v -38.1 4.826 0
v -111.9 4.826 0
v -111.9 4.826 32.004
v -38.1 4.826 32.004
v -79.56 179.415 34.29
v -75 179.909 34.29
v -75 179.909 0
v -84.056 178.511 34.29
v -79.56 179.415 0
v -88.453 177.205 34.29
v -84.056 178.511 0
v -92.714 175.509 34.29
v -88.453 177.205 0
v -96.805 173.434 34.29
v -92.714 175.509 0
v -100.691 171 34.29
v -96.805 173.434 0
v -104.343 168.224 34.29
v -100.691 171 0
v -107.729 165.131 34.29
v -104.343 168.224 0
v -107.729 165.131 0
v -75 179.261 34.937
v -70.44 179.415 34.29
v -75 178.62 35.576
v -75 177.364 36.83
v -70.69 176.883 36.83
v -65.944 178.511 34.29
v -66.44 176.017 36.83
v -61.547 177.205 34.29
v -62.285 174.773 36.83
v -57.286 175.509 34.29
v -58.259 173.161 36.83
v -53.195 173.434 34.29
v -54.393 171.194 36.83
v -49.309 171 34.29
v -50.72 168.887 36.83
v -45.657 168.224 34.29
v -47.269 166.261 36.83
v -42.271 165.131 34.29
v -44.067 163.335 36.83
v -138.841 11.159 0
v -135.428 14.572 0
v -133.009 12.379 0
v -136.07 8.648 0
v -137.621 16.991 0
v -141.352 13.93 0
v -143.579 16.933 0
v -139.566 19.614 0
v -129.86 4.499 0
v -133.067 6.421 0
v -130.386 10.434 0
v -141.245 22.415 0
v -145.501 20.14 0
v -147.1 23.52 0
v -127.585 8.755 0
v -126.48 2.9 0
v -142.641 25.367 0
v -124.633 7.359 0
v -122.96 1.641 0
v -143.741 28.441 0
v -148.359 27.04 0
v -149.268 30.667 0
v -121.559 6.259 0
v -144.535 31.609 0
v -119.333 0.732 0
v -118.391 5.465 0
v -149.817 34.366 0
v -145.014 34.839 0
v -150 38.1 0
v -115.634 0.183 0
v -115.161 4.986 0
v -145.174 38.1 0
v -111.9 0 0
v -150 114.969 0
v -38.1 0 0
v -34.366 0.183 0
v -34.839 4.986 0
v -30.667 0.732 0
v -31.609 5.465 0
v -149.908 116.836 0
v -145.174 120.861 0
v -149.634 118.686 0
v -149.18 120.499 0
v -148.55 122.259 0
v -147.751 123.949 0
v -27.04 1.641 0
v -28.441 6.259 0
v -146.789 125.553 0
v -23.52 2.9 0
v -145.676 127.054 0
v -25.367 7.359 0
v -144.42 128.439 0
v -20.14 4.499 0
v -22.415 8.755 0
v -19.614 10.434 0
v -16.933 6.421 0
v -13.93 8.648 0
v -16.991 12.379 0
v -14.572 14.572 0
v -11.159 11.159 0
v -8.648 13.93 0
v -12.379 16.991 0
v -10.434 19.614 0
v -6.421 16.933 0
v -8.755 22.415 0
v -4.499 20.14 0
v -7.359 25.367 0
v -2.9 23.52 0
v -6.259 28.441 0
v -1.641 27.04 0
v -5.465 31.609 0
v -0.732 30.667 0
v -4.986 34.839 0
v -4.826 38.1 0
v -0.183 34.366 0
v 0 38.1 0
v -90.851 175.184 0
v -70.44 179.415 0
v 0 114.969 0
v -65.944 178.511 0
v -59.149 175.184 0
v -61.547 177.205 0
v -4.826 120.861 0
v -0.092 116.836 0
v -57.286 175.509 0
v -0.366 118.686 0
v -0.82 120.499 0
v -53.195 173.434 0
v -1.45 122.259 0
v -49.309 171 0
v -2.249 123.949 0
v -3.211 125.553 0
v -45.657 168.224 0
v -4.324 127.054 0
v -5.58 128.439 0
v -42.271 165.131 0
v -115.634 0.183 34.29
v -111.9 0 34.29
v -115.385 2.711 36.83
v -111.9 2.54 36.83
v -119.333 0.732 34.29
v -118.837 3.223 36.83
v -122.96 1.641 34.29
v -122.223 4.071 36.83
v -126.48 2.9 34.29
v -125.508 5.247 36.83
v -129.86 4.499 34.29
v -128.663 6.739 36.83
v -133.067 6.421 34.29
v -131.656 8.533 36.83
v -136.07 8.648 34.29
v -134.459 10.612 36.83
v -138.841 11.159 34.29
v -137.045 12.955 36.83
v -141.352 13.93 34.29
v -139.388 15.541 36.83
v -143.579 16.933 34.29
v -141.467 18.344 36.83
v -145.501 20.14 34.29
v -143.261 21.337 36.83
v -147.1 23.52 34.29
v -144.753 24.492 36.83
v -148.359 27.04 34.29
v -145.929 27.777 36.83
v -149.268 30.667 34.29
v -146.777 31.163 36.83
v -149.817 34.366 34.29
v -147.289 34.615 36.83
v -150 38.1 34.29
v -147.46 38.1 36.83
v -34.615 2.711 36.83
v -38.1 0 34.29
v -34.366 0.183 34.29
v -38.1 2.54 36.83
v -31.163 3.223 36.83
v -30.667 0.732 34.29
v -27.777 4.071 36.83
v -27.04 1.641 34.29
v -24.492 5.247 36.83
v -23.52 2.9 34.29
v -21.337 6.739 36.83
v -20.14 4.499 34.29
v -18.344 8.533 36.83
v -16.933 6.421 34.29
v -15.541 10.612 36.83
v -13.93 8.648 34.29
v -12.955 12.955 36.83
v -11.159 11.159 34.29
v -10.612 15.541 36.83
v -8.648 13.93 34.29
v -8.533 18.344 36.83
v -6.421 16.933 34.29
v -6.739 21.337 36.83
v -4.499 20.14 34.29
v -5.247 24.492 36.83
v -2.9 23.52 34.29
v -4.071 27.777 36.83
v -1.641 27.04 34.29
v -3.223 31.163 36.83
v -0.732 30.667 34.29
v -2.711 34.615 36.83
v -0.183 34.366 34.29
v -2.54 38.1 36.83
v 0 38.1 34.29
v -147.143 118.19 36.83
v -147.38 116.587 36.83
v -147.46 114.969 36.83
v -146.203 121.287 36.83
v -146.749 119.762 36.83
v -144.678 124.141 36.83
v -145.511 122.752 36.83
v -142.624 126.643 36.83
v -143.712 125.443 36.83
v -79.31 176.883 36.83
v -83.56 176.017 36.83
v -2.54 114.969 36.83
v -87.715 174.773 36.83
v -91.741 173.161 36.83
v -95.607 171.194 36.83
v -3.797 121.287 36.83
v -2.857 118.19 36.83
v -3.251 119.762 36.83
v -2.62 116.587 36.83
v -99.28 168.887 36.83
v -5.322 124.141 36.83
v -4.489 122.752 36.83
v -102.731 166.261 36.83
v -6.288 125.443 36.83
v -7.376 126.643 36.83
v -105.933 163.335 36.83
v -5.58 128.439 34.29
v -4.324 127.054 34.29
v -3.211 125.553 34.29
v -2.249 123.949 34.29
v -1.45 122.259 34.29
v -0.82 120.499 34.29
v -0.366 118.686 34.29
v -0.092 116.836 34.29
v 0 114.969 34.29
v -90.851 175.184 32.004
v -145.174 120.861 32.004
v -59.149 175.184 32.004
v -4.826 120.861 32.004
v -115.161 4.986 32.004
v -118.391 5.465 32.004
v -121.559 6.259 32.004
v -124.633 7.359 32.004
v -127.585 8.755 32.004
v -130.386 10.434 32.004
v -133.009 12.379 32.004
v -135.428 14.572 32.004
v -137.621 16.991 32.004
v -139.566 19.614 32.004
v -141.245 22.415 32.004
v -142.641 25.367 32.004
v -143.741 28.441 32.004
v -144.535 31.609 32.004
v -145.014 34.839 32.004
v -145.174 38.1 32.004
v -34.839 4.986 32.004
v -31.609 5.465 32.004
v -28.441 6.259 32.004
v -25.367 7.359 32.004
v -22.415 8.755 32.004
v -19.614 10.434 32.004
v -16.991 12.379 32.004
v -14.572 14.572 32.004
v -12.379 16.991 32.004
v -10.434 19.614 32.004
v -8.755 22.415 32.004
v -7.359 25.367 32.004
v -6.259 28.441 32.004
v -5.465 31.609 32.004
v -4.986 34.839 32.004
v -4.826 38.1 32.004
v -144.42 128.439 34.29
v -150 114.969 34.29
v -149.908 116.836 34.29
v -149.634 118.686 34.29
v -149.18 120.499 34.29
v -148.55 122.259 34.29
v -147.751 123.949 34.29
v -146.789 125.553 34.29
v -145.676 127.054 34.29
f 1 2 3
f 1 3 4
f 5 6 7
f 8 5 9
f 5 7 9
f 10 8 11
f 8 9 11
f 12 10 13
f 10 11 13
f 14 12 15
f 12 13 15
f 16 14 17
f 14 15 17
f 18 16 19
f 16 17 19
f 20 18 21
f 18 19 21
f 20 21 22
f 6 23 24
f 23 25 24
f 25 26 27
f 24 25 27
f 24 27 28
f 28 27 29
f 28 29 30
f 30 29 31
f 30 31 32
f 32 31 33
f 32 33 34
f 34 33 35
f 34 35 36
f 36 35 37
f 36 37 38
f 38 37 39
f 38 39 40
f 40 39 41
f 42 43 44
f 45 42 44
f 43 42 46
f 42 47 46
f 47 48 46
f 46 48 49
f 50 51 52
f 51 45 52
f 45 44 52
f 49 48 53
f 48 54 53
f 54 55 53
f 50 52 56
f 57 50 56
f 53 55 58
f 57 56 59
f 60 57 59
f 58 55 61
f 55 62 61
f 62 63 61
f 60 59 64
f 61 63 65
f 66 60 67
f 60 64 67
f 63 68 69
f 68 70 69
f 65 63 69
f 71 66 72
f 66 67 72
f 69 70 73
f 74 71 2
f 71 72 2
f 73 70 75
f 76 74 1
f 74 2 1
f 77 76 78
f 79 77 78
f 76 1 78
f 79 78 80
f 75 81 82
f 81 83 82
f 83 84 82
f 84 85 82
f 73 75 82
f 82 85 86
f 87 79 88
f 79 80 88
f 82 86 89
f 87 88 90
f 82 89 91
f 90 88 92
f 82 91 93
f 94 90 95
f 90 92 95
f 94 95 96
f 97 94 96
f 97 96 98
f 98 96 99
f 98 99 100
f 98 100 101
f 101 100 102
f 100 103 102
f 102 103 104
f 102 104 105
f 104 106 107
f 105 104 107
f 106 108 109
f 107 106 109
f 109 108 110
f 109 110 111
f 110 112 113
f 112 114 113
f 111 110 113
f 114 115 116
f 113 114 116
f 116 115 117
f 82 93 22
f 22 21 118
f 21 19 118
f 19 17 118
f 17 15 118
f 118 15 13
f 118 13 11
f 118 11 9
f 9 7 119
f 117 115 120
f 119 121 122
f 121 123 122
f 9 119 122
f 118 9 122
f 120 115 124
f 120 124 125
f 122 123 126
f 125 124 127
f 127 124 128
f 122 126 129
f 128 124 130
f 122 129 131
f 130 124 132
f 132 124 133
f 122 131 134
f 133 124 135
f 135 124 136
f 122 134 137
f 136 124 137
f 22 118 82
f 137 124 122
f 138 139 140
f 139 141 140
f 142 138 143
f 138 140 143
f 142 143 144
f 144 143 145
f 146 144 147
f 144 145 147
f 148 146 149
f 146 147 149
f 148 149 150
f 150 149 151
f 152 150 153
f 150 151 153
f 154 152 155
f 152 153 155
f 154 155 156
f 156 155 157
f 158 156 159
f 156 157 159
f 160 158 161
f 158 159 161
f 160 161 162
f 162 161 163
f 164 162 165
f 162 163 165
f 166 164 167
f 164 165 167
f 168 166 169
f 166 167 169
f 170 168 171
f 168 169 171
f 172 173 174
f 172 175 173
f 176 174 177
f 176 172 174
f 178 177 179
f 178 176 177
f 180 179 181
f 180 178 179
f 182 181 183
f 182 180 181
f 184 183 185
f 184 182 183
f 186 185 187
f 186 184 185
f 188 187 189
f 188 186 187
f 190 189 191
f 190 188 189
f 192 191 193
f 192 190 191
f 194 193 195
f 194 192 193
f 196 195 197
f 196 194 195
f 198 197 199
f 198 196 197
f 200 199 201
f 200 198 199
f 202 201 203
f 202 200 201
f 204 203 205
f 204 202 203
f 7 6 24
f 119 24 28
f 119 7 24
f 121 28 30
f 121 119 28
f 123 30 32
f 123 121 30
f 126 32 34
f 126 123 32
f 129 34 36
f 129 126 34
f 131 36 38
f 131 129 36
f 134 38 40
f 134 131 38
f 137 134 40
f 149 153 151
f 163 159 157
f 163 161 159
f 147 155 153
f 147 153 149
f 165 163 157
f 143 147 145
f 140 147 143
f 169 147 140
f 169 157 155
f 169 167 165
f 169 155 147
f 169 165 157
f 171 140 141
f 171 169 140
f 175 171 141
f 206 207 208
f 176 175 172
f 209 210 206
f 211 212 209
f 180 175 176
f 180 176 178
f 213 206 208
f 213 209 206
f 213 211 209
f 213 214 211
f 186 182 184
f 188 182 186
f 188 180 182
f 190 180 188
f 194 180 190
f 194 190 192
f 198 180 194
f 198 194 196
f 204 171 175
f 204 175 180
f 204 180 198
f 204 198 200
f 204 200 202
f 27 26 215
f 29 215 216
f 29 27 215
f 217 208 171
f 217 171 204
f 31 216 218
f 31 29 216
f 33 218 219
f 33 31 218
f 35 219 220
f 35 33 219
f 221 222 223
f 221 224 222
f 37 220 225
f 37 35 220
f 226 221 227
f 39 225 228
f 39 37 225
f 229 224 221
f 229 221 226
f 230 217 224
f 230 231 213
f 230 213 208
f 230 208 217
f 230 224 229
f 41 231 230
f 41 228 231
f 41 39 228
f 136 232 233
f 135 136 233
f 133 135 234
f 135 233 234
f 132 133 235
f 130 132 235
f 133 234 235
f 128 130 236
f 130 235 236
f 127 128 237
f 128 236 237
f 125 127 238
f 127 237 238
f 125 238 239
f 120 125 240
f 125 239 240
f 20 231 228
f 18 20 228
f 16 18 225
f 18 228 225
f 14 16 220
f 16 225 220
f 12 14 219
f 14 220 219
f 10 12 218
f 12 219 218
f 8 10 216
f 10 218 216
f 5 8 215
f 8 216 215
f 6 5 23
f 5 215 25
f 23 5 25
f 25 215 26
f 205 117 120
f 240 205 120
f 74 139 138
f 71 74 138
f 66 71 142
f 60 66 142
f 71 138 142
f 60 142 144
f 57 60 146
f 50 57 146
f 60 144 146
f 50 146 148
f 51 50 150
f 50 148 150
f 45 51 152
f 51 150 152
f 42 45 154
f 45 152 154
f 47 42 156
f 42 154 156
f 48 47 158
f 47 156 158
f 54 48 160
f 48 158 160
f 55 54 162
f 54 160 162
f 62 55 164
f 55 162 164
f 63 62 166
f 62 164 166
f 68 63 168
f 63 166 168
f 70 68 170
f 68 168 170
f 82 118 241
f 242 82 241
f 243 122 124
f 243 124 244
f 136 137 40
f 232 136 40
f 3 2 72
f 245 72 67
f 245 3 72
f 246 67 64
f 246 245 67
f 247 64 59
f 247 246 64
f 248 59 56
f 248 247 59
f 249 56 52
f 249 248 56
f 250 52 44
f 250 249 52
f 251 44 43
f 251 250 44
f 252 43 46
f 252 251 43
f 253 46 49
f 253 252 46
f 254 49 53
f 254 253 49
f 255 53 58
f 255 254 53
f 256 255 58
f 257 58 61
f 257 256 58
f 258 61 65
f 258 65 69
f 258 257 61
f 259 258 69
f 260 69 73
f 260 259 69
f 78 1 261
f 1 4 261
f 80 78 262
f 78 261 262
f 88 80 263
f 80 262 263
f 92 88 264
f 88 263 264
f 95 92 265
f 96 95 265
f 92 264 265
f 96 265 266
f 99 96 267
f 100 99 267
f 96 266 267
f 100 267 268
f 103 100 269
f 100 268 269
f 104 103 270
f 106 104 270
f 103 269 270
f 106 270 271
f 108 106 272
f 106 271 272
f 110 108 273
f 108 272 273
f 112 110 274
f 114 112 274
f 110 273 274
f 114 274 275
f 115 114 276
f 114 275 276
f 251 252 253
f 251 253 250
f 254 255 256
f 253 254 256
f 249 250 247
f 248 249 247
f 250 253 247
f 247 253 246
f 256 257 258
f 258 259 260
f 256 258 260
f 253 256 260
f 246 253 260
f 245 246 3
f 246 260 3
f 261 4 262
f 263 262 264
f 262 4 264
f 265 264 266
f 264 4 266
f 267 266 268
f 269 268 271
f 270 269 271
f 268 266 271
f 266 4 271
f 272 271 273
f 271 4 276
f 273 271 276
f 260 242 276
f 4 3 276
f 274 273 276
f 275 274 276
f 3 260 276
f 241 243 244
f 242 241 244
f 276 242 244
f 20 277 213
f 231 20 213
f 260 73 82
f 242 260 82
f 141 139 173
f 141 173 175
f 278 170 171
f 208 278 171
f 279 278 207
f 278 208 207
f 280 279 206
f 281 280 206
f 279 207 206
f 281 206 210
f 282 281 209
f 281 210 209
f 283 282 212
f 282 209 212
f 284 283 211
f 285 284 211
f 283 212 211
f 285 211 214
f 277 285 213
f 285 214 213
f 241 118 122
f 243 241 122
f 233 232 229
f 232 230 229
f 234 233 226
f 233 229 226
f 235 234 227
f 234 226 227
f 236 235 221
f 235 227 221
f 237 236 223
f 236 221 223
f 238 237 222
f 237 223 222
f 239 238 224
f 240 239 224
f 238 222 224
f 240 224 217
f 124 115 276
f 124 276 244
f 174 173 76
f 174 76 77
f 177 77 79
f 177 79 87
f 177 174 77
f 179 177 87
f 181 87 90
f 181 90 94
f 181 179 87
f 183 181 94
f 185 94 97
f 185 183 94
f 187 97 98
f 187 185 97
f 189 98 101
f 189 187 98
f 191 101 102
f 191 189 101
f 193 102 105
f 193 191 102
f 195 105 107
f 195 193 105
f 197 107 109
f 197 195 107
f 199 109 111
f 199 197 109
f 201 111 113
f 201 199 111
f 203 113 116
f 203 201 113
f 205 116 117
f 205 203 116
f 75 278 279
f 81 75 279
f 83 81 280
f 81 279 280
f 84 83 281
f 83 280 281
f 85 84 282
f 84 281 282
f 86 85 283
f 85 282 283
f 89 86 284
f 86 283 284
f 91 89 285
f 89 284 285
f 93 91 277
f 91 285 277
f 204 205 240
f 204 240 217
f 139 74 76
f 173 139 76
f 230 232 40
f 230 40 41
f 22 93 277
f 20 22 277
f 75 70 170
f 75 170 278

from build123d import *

# Parameters (mm, degrees)
F0_W         = 150
F0_H         = 180.0098
F1_DEPTH     = 36.83
F2_R         = 38.1
F3_R         = 38.1
F4_SIZE      = 57.15
F5_SIZE      = 57.15
F6_T         = -4.826
F7_T1_DEPTH  = 142.0402448428
F8_R         = 19.05
F9_T1_DEPTH  = 51.8894877579
F9_T3_DEPTH  = 76.8690316368
F9_T5_DEPTH  = 73.8
F9_T7_DEPTH  = 51.8894877579
F9_T10_ANGLE = 78.2371868637
F9_T12_ANGLE = 78.2371868637
F9_T14_ANGLE = 45
F9_T16_ANGLE = 90
F9_T18_ANGLE = 90
F9_T20_ANGLE = 45


# Not quite as in the source:
# - a fillet or chamfer that OpenCascade refuses, or shapes differently, is made with other operations: its cross-section is extruded or revolved along the edge and cut away or added


with BuildPart() as f1:
    # F0 (on Top) → F1 (new body)
    with BuildSketch(Plane.XY):
        with Locations((-75, 90.0049)):
            Rectangle(F0_W, F0_H)
    extrude(amount=F1_DEPTH)

    # F2
    f2_edges = [f1.edges().sort_by_distance(p)[0] for p in [
        (0, 0, 18.415),
    ]]
    fillet(f2_edges, radius=F2_R)

    # F3
    f3_edges = [f1.edges().sort_by_distance(p)[0] for p in [
        (-150, 0, 18.415),
    ]]
    fillet(f3_edges, radius=F3_R)

    # F4
    f4_edges = [f1.edges().sort_by_distance(p)[0] for p in [
        (-150, 180.0098, 18.415),
    ]]
    chamfer(f4_edges, length=F4_SIZE)

    # F5
    f5_edges = [f1.edges().sort_by_distance(p)[0] for p in [
        (0, 180.0098, 18.415),
    ]]
    chamfer(f5_edges, length=F5_SIZE)

    # F6
    f6_openings = [f1.faces().sort_by_distance(p)[0] for p in [
        (-75, 82.174731, 0),
    ]]
    offset(amount=F6_T, openings=f6_openings)

    # F7: fillet of radius 50.8 on 2 edges, made by hand

    # F7_s2 → F7_t1 (cut)
    with BuildSketch(Plane.XY.offset(-52.6051224214)):
        with BuildLine():
            ThreePointArc((-71.8079510314, 180.0098), (-91.2482693956, 176.1428802516), (-107.7289755157, 165.1308244843))
            Line((-107.7289755157, 165.1308244843), (-92.85, 180.0098))
            Line((-92.85, 180.0098), (-71.8079510314, 180.0098))
        make_face()
        with BuildLine():
            ThreePointArc((-78.1920489686, 180.0098), (-58.7517306044, 176.1428802516), (-42.2710244843, 165.1308244843))
            Line((-42.2710244843, 165.1308244843), (-57.15, 180.0098))
            Line((-57.15, 180.0098), (-78.1920489686, 180.0098))
        make_face()
    extrude(amount=F7_T1_DEPTH, mode=Mode.SUBTRACT)

    # F8
    f8_edges = [f1.edges().sort_by_distance(p)[0] for p in [
        (-150, 122.8598, 18.415),
        (0, 122.8598, 18.415),
    ]]
    fillet(f8_edges, radius=F8_R)

    # F9: chamfer of 2.54 on 10 edges, made by hand

    # F9_s2 → F9_t1 (cut)
    with BuildSketch(Plane(origin=(-7.9904841816, -7.9904841816, 0), x_dir=(0, 0, 1), z_dir=(0.7071067812, 0.7071067812, 0))):
        Polygon((34.29, -192.9410148932), (36.83, -190.4010148932), (36.83, -192.9410148932), align=None)
    extrude(amount=F9_T1_DEPTH, mode=Mode.SUBTRACT)

    # F9_s4 → F9_t3 (cut)
    with BuildSketch(Plane.XZ.offset(-114.9690316368)):
        Polygon((-150, 34.29), (-147.46, 36.83), (-150, 36.83), align=None)
        Polygon((0, 34.29), (-2.54, 36.83), (0, 36.83), align=None)
    extrude(amount=F9_T3_DEPTH, mode=Mode.SUBTRACT)

    # F9_s6 → F9_t5 (cut)
    with BuildSketch(Plane.YZ.offset(-111.9)):
        Polygon((0, 34.29), (2.54, 36.83), (0, 36.83), align=None)
    extrude(amount=F9_T5_DEPTH, mode=Mode.SUBTRACT)

    # F9_s8 → F9_t7 (cut)
    with BuildSketch(Plane(origin=(-103.7009244843, 103.7009244843, 0), x_dir=(0, 0, 1), z_dir=(0.7071067812, -0.7071067812, 0))):
        Polygon((34.29, -86.8749977152), (36.83, -84.3349977152), (36.83, -86.8749977152), align=None)
    extrude(amount=F9_T7_DEPTH, mode=Mode.SUBTRACT)

    # F9_s9 → F9_t10 (revolve, cut)
    with BuildSketch(Plane(origin=(4.5334842912, 2.9708331336, 0), x_dir=(0, 0, 1), z_dir=(-0.8364087505, -0.548106196, 0))):
        Polygon((34.29, 201.7297538876), (36.83, 199.1897538876), (36.83, 201.7297538876), align=None)
    revolve(axis=Axis((-78.1920489684, 129.2098000003, 36.83), (0, 0, -1)), revolution_arc=F9_T10_ANGLE, mode=Mode.SUBTRACT)

    # F9_s11 → F9_t12 (revolve, cut)
    with BuildSketch(Plane(origin=(28.7009244845, 28.7009244846, 0), x_dir=(0, 0, 1), z_dir=(-0.7071067812, -0.7071067812, 0))):
        Polygon((34.29, 192.9410148931), (36.83, 190.4010148931), (36.83, 192.9410148931), align=None)
    revolve(axis=Axis((-71.8079510316, 129.2098000003, 36.83), (0, 0, -1)), revolution_arc=F9_T12_ANGLE, mode=Mode.SUBTRACT)

    # F9_s13 → F9_t14 (revolve, cut)
    with BuildSketch(Plane.XZ.offset(-114.9690316368)):
        Polygon((-150, 34.29), (-147.46, 36.83), (-150, 36.83), align=None)
    revolve(axis=Axis((-130.95, 114.9690316368, 36.83), (0, 0, -1)), revolution_arc=F9_T14_ANGLE, mode=Mode.SUBTRACT)

    # F9_s15 → F9_t16 (revolve, cut)
    with BuildSketch(Plane.YZ.offset(-111.9)):
        Polygon((0, 34.29), (2.54, 36.83), (0, 36.83), align=None)
    revolve(axis=Axis((-111.9, 38.1, 36.83), (0, 0, -1)), revolution_arc=F9_T16_ANGLE, mode=Mode.SUBTRACT)

    # F9_s17 → F9_t18 (revolve, cut)
    with BuildSketch(Plane.YZ.offset(-38.1)):
        Polygon((0, 34.29), (2.54, 36.83), (0, 36.83), align=None)
    revolve(axis=Axis((-38.1, 38.1, 36.83), (0, 0, 1)), revolution_arc=F9_T18_ANGLE, mode=Mode.SUBTRACT)

    # F9_s19 → F9_t20 (revolve, cut)
    with BuildSketch(Plane(origin=(-67.0095158184, 67.0095158184, 0), x_dir=(0, 0, 1), z_dir=(-0.7071067812, 0.7071067812, 0))):
        Polygon((34.29, 86.8749977152), (36.83, 84.3349977152), (36.83, 86.8749977152), align=None)
    revolve(axis=Axis((-19.05, 114.9690316368, 36.83), (0, 0, -1)), revolution_arc=F9_T20_ANGLE, mode=Mode.SUBTRACT)


solid = f1.part
